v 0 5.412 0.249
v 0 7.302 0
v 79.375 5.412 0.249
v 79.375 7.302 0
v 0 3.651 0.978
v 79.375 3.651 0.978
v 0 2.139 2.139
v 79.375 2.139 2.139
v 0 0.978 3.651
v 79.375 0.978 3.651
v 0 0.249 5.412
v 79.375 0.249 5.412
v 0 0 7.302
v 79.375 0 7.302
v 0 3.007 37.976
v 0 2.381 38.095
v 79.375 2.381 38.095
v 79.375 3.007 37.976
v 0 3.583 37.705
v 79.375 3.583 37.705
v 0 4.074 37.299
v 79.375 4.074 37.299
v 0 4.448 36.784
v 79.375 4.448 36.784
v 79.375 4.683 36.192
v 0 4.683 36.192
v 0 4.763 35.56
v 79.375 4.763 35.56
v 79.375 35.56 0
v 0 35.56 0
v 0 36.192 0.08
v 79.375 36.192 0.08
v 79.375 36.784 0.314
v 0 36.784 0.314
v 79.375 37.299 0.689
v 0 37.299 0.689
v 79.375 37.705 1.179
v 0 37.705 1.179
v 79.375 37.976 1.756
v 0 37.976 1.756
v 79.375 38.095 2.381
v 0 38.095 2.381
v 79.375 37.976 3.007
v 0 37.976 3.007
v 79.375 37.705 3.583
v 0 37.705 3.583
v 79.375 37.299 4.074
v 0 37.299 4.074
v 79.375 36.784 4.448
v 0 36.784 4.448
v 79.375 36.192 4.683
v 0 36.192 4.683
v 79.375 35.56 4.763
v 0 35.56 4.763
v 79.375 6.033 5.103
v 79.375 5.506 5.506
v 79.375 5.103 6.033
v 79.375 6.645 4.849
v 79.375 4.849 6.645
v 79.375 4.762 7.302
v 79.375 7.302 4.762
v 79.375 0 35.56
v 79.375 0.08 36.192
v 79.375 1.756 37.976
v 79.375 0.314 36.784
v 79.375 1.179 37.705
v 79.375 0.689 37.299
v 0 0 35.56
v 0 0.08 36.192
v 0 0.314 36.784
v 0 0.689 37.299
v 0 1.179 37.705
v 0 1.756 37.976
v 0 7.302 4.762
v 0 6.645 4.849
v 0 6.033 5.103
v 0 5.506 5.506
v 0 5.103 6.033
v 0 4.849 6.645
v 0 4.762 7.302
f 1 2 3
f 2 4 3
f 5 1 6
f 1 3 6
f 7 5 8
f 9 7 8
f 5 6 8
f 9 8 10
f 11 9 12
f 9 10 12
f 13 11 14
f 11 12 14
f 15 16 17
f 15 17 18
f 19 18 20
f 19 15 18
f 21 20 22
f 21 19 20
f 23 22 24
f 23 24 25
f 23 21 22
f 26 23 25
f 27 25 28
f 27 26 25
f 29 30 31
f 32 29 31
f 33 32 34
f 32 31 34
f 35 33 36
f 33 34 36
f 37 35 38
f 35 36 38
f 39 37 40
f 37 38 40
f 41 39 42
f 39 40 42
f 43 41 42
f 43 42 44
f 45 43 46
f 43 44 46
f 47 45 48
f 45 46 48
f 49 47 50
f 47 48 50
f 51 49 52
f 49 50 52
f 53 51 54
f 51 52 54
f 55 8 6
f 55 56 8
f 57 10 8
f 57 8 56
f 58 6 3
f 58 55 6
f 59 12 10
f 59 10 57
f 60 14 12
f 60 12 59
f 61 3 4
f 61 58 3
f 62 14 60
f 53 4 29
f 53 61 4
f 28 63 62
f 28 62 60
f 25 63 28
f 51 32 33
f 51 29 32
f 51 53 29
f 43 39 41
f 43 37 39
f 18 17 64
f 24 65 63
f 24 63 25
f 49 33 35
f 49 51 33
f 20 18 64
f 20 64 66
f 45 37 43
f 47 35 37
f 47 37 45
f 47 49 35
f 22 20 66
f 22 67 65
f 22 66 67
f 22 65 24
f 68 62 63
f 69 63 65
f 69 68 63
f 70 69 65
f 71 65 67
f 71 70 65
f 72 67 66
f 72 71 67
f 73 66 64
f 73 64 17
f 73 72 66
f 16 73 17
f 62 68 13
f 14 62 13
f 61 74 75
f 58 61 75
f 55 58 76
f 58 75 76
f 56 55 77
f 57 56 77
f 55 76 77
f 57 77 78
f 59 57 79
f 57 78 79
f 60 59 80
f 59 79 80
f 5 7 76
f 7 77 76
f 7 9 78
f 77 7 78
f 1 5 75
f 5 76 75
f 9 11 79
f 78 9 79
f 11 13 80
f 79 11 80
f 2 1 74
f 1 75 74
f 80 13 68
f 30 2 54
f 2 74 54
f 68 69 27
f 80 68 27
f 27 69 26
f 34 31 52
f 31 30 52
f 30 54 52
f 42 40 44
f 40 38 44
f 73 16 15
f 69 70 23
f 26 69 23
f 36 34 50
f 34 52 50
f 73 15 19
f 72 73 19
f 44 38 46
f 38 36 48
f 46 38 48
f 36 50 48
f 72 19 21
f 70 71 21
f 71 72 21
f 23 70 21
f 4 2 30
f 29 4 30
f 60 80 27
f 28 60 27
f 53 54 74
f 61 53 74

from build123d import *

# Parameters (mm, degrees)
F1_DEPTH    = 79.375
F2_T1_DEPTH = 79.375
F2_T3_DEPTH = 92.075
F3_R        = 7.3025


# Not quite as in the source:
# - a fillet or chamfer that OpenCascade refuses, or shapes differently, is made with other operations: its cross-section is extruded or revolved along the edge and cut away or added


with BuildPart() as f1:
    # F0 (on Right) → F1 (new body)
    with BuildSketch(Plane.YZ):
        Polygon((0, 38.1), (0, 0), (38.1, 0), (38.1, 4.7625), (4.7625, 4.7625), (4.7625, 38.1), align=None)
    extrude(amount=F1_DEPTH)

    # F2: fillet of radius 2.54 on 5 edges, made by hand

    # F2_s2 → F2_t1 (join)
    with BuildSketch(Plane.YZ):
        with BuildLine():
            ThreePointArc((7.3025, 4.7625), (5.5064487758, 5.5064487758), (4.7625, 7.3025))
            Line((4.7625, 7.3025), (4.7625, 4.7625))
            Line((4.7625, 4.7625), (7.3025, 4.7625))
        make_face()
    extrude(amount=F2_T1_DEPTH)

    # F2_s4 → F2_t3 (cut)
    with BuildSketch(Plane.YZ.offset(-6.35)):
        with BuildLine():
            ThreePointArc((2.2225, 38.1), (4.0185512242, 37.3560512242), (4.7625, 35.56))
            Line((4.7625, 35.56), (4.7625, 38.1))
            Line((4.7625, 38.1), (2.2225, 38.1))
        make_face()
        with BuildLine():
            ThreePointArc((0, 35.56), (0.7439487758, 37.3560512242), (2.54, 38.1))
            Line((2.54, 38.1), (0, 38.1))
            Line((0, 38.1), (0, 35.56))
        make_face()
        with BuildLine():
            ThreePointArc((38.1, 2.2225), (37.3560512242, 4.0185512242), (35.56, 4.7625))
            Line((35.56, 4.7625), (38.1, 4.7625))
            Line((38.1, 4.7625), (38.1, 2.2225))
        make_face()
        with BuildLine():
            ThreePointArc((35.56, 0), (37.3560512242, 0.7439487758), (38.1, 2.54))
            Line((38.1, 2.54), (38.1, 0))
            Line((38.1, 0), (35.56, 0))
        make_face()
    extrude(amount=F2_T3_DEPTH, mode=Mode.SUBTRACT)

    # F3
    f3_edges = [f1.edges().sort_by_distance(p)[0] for p in [
        (39.6875, 0, 0),
    ]]
    fillet(f3_edges, radius=F3_R)


solid = f1.part
